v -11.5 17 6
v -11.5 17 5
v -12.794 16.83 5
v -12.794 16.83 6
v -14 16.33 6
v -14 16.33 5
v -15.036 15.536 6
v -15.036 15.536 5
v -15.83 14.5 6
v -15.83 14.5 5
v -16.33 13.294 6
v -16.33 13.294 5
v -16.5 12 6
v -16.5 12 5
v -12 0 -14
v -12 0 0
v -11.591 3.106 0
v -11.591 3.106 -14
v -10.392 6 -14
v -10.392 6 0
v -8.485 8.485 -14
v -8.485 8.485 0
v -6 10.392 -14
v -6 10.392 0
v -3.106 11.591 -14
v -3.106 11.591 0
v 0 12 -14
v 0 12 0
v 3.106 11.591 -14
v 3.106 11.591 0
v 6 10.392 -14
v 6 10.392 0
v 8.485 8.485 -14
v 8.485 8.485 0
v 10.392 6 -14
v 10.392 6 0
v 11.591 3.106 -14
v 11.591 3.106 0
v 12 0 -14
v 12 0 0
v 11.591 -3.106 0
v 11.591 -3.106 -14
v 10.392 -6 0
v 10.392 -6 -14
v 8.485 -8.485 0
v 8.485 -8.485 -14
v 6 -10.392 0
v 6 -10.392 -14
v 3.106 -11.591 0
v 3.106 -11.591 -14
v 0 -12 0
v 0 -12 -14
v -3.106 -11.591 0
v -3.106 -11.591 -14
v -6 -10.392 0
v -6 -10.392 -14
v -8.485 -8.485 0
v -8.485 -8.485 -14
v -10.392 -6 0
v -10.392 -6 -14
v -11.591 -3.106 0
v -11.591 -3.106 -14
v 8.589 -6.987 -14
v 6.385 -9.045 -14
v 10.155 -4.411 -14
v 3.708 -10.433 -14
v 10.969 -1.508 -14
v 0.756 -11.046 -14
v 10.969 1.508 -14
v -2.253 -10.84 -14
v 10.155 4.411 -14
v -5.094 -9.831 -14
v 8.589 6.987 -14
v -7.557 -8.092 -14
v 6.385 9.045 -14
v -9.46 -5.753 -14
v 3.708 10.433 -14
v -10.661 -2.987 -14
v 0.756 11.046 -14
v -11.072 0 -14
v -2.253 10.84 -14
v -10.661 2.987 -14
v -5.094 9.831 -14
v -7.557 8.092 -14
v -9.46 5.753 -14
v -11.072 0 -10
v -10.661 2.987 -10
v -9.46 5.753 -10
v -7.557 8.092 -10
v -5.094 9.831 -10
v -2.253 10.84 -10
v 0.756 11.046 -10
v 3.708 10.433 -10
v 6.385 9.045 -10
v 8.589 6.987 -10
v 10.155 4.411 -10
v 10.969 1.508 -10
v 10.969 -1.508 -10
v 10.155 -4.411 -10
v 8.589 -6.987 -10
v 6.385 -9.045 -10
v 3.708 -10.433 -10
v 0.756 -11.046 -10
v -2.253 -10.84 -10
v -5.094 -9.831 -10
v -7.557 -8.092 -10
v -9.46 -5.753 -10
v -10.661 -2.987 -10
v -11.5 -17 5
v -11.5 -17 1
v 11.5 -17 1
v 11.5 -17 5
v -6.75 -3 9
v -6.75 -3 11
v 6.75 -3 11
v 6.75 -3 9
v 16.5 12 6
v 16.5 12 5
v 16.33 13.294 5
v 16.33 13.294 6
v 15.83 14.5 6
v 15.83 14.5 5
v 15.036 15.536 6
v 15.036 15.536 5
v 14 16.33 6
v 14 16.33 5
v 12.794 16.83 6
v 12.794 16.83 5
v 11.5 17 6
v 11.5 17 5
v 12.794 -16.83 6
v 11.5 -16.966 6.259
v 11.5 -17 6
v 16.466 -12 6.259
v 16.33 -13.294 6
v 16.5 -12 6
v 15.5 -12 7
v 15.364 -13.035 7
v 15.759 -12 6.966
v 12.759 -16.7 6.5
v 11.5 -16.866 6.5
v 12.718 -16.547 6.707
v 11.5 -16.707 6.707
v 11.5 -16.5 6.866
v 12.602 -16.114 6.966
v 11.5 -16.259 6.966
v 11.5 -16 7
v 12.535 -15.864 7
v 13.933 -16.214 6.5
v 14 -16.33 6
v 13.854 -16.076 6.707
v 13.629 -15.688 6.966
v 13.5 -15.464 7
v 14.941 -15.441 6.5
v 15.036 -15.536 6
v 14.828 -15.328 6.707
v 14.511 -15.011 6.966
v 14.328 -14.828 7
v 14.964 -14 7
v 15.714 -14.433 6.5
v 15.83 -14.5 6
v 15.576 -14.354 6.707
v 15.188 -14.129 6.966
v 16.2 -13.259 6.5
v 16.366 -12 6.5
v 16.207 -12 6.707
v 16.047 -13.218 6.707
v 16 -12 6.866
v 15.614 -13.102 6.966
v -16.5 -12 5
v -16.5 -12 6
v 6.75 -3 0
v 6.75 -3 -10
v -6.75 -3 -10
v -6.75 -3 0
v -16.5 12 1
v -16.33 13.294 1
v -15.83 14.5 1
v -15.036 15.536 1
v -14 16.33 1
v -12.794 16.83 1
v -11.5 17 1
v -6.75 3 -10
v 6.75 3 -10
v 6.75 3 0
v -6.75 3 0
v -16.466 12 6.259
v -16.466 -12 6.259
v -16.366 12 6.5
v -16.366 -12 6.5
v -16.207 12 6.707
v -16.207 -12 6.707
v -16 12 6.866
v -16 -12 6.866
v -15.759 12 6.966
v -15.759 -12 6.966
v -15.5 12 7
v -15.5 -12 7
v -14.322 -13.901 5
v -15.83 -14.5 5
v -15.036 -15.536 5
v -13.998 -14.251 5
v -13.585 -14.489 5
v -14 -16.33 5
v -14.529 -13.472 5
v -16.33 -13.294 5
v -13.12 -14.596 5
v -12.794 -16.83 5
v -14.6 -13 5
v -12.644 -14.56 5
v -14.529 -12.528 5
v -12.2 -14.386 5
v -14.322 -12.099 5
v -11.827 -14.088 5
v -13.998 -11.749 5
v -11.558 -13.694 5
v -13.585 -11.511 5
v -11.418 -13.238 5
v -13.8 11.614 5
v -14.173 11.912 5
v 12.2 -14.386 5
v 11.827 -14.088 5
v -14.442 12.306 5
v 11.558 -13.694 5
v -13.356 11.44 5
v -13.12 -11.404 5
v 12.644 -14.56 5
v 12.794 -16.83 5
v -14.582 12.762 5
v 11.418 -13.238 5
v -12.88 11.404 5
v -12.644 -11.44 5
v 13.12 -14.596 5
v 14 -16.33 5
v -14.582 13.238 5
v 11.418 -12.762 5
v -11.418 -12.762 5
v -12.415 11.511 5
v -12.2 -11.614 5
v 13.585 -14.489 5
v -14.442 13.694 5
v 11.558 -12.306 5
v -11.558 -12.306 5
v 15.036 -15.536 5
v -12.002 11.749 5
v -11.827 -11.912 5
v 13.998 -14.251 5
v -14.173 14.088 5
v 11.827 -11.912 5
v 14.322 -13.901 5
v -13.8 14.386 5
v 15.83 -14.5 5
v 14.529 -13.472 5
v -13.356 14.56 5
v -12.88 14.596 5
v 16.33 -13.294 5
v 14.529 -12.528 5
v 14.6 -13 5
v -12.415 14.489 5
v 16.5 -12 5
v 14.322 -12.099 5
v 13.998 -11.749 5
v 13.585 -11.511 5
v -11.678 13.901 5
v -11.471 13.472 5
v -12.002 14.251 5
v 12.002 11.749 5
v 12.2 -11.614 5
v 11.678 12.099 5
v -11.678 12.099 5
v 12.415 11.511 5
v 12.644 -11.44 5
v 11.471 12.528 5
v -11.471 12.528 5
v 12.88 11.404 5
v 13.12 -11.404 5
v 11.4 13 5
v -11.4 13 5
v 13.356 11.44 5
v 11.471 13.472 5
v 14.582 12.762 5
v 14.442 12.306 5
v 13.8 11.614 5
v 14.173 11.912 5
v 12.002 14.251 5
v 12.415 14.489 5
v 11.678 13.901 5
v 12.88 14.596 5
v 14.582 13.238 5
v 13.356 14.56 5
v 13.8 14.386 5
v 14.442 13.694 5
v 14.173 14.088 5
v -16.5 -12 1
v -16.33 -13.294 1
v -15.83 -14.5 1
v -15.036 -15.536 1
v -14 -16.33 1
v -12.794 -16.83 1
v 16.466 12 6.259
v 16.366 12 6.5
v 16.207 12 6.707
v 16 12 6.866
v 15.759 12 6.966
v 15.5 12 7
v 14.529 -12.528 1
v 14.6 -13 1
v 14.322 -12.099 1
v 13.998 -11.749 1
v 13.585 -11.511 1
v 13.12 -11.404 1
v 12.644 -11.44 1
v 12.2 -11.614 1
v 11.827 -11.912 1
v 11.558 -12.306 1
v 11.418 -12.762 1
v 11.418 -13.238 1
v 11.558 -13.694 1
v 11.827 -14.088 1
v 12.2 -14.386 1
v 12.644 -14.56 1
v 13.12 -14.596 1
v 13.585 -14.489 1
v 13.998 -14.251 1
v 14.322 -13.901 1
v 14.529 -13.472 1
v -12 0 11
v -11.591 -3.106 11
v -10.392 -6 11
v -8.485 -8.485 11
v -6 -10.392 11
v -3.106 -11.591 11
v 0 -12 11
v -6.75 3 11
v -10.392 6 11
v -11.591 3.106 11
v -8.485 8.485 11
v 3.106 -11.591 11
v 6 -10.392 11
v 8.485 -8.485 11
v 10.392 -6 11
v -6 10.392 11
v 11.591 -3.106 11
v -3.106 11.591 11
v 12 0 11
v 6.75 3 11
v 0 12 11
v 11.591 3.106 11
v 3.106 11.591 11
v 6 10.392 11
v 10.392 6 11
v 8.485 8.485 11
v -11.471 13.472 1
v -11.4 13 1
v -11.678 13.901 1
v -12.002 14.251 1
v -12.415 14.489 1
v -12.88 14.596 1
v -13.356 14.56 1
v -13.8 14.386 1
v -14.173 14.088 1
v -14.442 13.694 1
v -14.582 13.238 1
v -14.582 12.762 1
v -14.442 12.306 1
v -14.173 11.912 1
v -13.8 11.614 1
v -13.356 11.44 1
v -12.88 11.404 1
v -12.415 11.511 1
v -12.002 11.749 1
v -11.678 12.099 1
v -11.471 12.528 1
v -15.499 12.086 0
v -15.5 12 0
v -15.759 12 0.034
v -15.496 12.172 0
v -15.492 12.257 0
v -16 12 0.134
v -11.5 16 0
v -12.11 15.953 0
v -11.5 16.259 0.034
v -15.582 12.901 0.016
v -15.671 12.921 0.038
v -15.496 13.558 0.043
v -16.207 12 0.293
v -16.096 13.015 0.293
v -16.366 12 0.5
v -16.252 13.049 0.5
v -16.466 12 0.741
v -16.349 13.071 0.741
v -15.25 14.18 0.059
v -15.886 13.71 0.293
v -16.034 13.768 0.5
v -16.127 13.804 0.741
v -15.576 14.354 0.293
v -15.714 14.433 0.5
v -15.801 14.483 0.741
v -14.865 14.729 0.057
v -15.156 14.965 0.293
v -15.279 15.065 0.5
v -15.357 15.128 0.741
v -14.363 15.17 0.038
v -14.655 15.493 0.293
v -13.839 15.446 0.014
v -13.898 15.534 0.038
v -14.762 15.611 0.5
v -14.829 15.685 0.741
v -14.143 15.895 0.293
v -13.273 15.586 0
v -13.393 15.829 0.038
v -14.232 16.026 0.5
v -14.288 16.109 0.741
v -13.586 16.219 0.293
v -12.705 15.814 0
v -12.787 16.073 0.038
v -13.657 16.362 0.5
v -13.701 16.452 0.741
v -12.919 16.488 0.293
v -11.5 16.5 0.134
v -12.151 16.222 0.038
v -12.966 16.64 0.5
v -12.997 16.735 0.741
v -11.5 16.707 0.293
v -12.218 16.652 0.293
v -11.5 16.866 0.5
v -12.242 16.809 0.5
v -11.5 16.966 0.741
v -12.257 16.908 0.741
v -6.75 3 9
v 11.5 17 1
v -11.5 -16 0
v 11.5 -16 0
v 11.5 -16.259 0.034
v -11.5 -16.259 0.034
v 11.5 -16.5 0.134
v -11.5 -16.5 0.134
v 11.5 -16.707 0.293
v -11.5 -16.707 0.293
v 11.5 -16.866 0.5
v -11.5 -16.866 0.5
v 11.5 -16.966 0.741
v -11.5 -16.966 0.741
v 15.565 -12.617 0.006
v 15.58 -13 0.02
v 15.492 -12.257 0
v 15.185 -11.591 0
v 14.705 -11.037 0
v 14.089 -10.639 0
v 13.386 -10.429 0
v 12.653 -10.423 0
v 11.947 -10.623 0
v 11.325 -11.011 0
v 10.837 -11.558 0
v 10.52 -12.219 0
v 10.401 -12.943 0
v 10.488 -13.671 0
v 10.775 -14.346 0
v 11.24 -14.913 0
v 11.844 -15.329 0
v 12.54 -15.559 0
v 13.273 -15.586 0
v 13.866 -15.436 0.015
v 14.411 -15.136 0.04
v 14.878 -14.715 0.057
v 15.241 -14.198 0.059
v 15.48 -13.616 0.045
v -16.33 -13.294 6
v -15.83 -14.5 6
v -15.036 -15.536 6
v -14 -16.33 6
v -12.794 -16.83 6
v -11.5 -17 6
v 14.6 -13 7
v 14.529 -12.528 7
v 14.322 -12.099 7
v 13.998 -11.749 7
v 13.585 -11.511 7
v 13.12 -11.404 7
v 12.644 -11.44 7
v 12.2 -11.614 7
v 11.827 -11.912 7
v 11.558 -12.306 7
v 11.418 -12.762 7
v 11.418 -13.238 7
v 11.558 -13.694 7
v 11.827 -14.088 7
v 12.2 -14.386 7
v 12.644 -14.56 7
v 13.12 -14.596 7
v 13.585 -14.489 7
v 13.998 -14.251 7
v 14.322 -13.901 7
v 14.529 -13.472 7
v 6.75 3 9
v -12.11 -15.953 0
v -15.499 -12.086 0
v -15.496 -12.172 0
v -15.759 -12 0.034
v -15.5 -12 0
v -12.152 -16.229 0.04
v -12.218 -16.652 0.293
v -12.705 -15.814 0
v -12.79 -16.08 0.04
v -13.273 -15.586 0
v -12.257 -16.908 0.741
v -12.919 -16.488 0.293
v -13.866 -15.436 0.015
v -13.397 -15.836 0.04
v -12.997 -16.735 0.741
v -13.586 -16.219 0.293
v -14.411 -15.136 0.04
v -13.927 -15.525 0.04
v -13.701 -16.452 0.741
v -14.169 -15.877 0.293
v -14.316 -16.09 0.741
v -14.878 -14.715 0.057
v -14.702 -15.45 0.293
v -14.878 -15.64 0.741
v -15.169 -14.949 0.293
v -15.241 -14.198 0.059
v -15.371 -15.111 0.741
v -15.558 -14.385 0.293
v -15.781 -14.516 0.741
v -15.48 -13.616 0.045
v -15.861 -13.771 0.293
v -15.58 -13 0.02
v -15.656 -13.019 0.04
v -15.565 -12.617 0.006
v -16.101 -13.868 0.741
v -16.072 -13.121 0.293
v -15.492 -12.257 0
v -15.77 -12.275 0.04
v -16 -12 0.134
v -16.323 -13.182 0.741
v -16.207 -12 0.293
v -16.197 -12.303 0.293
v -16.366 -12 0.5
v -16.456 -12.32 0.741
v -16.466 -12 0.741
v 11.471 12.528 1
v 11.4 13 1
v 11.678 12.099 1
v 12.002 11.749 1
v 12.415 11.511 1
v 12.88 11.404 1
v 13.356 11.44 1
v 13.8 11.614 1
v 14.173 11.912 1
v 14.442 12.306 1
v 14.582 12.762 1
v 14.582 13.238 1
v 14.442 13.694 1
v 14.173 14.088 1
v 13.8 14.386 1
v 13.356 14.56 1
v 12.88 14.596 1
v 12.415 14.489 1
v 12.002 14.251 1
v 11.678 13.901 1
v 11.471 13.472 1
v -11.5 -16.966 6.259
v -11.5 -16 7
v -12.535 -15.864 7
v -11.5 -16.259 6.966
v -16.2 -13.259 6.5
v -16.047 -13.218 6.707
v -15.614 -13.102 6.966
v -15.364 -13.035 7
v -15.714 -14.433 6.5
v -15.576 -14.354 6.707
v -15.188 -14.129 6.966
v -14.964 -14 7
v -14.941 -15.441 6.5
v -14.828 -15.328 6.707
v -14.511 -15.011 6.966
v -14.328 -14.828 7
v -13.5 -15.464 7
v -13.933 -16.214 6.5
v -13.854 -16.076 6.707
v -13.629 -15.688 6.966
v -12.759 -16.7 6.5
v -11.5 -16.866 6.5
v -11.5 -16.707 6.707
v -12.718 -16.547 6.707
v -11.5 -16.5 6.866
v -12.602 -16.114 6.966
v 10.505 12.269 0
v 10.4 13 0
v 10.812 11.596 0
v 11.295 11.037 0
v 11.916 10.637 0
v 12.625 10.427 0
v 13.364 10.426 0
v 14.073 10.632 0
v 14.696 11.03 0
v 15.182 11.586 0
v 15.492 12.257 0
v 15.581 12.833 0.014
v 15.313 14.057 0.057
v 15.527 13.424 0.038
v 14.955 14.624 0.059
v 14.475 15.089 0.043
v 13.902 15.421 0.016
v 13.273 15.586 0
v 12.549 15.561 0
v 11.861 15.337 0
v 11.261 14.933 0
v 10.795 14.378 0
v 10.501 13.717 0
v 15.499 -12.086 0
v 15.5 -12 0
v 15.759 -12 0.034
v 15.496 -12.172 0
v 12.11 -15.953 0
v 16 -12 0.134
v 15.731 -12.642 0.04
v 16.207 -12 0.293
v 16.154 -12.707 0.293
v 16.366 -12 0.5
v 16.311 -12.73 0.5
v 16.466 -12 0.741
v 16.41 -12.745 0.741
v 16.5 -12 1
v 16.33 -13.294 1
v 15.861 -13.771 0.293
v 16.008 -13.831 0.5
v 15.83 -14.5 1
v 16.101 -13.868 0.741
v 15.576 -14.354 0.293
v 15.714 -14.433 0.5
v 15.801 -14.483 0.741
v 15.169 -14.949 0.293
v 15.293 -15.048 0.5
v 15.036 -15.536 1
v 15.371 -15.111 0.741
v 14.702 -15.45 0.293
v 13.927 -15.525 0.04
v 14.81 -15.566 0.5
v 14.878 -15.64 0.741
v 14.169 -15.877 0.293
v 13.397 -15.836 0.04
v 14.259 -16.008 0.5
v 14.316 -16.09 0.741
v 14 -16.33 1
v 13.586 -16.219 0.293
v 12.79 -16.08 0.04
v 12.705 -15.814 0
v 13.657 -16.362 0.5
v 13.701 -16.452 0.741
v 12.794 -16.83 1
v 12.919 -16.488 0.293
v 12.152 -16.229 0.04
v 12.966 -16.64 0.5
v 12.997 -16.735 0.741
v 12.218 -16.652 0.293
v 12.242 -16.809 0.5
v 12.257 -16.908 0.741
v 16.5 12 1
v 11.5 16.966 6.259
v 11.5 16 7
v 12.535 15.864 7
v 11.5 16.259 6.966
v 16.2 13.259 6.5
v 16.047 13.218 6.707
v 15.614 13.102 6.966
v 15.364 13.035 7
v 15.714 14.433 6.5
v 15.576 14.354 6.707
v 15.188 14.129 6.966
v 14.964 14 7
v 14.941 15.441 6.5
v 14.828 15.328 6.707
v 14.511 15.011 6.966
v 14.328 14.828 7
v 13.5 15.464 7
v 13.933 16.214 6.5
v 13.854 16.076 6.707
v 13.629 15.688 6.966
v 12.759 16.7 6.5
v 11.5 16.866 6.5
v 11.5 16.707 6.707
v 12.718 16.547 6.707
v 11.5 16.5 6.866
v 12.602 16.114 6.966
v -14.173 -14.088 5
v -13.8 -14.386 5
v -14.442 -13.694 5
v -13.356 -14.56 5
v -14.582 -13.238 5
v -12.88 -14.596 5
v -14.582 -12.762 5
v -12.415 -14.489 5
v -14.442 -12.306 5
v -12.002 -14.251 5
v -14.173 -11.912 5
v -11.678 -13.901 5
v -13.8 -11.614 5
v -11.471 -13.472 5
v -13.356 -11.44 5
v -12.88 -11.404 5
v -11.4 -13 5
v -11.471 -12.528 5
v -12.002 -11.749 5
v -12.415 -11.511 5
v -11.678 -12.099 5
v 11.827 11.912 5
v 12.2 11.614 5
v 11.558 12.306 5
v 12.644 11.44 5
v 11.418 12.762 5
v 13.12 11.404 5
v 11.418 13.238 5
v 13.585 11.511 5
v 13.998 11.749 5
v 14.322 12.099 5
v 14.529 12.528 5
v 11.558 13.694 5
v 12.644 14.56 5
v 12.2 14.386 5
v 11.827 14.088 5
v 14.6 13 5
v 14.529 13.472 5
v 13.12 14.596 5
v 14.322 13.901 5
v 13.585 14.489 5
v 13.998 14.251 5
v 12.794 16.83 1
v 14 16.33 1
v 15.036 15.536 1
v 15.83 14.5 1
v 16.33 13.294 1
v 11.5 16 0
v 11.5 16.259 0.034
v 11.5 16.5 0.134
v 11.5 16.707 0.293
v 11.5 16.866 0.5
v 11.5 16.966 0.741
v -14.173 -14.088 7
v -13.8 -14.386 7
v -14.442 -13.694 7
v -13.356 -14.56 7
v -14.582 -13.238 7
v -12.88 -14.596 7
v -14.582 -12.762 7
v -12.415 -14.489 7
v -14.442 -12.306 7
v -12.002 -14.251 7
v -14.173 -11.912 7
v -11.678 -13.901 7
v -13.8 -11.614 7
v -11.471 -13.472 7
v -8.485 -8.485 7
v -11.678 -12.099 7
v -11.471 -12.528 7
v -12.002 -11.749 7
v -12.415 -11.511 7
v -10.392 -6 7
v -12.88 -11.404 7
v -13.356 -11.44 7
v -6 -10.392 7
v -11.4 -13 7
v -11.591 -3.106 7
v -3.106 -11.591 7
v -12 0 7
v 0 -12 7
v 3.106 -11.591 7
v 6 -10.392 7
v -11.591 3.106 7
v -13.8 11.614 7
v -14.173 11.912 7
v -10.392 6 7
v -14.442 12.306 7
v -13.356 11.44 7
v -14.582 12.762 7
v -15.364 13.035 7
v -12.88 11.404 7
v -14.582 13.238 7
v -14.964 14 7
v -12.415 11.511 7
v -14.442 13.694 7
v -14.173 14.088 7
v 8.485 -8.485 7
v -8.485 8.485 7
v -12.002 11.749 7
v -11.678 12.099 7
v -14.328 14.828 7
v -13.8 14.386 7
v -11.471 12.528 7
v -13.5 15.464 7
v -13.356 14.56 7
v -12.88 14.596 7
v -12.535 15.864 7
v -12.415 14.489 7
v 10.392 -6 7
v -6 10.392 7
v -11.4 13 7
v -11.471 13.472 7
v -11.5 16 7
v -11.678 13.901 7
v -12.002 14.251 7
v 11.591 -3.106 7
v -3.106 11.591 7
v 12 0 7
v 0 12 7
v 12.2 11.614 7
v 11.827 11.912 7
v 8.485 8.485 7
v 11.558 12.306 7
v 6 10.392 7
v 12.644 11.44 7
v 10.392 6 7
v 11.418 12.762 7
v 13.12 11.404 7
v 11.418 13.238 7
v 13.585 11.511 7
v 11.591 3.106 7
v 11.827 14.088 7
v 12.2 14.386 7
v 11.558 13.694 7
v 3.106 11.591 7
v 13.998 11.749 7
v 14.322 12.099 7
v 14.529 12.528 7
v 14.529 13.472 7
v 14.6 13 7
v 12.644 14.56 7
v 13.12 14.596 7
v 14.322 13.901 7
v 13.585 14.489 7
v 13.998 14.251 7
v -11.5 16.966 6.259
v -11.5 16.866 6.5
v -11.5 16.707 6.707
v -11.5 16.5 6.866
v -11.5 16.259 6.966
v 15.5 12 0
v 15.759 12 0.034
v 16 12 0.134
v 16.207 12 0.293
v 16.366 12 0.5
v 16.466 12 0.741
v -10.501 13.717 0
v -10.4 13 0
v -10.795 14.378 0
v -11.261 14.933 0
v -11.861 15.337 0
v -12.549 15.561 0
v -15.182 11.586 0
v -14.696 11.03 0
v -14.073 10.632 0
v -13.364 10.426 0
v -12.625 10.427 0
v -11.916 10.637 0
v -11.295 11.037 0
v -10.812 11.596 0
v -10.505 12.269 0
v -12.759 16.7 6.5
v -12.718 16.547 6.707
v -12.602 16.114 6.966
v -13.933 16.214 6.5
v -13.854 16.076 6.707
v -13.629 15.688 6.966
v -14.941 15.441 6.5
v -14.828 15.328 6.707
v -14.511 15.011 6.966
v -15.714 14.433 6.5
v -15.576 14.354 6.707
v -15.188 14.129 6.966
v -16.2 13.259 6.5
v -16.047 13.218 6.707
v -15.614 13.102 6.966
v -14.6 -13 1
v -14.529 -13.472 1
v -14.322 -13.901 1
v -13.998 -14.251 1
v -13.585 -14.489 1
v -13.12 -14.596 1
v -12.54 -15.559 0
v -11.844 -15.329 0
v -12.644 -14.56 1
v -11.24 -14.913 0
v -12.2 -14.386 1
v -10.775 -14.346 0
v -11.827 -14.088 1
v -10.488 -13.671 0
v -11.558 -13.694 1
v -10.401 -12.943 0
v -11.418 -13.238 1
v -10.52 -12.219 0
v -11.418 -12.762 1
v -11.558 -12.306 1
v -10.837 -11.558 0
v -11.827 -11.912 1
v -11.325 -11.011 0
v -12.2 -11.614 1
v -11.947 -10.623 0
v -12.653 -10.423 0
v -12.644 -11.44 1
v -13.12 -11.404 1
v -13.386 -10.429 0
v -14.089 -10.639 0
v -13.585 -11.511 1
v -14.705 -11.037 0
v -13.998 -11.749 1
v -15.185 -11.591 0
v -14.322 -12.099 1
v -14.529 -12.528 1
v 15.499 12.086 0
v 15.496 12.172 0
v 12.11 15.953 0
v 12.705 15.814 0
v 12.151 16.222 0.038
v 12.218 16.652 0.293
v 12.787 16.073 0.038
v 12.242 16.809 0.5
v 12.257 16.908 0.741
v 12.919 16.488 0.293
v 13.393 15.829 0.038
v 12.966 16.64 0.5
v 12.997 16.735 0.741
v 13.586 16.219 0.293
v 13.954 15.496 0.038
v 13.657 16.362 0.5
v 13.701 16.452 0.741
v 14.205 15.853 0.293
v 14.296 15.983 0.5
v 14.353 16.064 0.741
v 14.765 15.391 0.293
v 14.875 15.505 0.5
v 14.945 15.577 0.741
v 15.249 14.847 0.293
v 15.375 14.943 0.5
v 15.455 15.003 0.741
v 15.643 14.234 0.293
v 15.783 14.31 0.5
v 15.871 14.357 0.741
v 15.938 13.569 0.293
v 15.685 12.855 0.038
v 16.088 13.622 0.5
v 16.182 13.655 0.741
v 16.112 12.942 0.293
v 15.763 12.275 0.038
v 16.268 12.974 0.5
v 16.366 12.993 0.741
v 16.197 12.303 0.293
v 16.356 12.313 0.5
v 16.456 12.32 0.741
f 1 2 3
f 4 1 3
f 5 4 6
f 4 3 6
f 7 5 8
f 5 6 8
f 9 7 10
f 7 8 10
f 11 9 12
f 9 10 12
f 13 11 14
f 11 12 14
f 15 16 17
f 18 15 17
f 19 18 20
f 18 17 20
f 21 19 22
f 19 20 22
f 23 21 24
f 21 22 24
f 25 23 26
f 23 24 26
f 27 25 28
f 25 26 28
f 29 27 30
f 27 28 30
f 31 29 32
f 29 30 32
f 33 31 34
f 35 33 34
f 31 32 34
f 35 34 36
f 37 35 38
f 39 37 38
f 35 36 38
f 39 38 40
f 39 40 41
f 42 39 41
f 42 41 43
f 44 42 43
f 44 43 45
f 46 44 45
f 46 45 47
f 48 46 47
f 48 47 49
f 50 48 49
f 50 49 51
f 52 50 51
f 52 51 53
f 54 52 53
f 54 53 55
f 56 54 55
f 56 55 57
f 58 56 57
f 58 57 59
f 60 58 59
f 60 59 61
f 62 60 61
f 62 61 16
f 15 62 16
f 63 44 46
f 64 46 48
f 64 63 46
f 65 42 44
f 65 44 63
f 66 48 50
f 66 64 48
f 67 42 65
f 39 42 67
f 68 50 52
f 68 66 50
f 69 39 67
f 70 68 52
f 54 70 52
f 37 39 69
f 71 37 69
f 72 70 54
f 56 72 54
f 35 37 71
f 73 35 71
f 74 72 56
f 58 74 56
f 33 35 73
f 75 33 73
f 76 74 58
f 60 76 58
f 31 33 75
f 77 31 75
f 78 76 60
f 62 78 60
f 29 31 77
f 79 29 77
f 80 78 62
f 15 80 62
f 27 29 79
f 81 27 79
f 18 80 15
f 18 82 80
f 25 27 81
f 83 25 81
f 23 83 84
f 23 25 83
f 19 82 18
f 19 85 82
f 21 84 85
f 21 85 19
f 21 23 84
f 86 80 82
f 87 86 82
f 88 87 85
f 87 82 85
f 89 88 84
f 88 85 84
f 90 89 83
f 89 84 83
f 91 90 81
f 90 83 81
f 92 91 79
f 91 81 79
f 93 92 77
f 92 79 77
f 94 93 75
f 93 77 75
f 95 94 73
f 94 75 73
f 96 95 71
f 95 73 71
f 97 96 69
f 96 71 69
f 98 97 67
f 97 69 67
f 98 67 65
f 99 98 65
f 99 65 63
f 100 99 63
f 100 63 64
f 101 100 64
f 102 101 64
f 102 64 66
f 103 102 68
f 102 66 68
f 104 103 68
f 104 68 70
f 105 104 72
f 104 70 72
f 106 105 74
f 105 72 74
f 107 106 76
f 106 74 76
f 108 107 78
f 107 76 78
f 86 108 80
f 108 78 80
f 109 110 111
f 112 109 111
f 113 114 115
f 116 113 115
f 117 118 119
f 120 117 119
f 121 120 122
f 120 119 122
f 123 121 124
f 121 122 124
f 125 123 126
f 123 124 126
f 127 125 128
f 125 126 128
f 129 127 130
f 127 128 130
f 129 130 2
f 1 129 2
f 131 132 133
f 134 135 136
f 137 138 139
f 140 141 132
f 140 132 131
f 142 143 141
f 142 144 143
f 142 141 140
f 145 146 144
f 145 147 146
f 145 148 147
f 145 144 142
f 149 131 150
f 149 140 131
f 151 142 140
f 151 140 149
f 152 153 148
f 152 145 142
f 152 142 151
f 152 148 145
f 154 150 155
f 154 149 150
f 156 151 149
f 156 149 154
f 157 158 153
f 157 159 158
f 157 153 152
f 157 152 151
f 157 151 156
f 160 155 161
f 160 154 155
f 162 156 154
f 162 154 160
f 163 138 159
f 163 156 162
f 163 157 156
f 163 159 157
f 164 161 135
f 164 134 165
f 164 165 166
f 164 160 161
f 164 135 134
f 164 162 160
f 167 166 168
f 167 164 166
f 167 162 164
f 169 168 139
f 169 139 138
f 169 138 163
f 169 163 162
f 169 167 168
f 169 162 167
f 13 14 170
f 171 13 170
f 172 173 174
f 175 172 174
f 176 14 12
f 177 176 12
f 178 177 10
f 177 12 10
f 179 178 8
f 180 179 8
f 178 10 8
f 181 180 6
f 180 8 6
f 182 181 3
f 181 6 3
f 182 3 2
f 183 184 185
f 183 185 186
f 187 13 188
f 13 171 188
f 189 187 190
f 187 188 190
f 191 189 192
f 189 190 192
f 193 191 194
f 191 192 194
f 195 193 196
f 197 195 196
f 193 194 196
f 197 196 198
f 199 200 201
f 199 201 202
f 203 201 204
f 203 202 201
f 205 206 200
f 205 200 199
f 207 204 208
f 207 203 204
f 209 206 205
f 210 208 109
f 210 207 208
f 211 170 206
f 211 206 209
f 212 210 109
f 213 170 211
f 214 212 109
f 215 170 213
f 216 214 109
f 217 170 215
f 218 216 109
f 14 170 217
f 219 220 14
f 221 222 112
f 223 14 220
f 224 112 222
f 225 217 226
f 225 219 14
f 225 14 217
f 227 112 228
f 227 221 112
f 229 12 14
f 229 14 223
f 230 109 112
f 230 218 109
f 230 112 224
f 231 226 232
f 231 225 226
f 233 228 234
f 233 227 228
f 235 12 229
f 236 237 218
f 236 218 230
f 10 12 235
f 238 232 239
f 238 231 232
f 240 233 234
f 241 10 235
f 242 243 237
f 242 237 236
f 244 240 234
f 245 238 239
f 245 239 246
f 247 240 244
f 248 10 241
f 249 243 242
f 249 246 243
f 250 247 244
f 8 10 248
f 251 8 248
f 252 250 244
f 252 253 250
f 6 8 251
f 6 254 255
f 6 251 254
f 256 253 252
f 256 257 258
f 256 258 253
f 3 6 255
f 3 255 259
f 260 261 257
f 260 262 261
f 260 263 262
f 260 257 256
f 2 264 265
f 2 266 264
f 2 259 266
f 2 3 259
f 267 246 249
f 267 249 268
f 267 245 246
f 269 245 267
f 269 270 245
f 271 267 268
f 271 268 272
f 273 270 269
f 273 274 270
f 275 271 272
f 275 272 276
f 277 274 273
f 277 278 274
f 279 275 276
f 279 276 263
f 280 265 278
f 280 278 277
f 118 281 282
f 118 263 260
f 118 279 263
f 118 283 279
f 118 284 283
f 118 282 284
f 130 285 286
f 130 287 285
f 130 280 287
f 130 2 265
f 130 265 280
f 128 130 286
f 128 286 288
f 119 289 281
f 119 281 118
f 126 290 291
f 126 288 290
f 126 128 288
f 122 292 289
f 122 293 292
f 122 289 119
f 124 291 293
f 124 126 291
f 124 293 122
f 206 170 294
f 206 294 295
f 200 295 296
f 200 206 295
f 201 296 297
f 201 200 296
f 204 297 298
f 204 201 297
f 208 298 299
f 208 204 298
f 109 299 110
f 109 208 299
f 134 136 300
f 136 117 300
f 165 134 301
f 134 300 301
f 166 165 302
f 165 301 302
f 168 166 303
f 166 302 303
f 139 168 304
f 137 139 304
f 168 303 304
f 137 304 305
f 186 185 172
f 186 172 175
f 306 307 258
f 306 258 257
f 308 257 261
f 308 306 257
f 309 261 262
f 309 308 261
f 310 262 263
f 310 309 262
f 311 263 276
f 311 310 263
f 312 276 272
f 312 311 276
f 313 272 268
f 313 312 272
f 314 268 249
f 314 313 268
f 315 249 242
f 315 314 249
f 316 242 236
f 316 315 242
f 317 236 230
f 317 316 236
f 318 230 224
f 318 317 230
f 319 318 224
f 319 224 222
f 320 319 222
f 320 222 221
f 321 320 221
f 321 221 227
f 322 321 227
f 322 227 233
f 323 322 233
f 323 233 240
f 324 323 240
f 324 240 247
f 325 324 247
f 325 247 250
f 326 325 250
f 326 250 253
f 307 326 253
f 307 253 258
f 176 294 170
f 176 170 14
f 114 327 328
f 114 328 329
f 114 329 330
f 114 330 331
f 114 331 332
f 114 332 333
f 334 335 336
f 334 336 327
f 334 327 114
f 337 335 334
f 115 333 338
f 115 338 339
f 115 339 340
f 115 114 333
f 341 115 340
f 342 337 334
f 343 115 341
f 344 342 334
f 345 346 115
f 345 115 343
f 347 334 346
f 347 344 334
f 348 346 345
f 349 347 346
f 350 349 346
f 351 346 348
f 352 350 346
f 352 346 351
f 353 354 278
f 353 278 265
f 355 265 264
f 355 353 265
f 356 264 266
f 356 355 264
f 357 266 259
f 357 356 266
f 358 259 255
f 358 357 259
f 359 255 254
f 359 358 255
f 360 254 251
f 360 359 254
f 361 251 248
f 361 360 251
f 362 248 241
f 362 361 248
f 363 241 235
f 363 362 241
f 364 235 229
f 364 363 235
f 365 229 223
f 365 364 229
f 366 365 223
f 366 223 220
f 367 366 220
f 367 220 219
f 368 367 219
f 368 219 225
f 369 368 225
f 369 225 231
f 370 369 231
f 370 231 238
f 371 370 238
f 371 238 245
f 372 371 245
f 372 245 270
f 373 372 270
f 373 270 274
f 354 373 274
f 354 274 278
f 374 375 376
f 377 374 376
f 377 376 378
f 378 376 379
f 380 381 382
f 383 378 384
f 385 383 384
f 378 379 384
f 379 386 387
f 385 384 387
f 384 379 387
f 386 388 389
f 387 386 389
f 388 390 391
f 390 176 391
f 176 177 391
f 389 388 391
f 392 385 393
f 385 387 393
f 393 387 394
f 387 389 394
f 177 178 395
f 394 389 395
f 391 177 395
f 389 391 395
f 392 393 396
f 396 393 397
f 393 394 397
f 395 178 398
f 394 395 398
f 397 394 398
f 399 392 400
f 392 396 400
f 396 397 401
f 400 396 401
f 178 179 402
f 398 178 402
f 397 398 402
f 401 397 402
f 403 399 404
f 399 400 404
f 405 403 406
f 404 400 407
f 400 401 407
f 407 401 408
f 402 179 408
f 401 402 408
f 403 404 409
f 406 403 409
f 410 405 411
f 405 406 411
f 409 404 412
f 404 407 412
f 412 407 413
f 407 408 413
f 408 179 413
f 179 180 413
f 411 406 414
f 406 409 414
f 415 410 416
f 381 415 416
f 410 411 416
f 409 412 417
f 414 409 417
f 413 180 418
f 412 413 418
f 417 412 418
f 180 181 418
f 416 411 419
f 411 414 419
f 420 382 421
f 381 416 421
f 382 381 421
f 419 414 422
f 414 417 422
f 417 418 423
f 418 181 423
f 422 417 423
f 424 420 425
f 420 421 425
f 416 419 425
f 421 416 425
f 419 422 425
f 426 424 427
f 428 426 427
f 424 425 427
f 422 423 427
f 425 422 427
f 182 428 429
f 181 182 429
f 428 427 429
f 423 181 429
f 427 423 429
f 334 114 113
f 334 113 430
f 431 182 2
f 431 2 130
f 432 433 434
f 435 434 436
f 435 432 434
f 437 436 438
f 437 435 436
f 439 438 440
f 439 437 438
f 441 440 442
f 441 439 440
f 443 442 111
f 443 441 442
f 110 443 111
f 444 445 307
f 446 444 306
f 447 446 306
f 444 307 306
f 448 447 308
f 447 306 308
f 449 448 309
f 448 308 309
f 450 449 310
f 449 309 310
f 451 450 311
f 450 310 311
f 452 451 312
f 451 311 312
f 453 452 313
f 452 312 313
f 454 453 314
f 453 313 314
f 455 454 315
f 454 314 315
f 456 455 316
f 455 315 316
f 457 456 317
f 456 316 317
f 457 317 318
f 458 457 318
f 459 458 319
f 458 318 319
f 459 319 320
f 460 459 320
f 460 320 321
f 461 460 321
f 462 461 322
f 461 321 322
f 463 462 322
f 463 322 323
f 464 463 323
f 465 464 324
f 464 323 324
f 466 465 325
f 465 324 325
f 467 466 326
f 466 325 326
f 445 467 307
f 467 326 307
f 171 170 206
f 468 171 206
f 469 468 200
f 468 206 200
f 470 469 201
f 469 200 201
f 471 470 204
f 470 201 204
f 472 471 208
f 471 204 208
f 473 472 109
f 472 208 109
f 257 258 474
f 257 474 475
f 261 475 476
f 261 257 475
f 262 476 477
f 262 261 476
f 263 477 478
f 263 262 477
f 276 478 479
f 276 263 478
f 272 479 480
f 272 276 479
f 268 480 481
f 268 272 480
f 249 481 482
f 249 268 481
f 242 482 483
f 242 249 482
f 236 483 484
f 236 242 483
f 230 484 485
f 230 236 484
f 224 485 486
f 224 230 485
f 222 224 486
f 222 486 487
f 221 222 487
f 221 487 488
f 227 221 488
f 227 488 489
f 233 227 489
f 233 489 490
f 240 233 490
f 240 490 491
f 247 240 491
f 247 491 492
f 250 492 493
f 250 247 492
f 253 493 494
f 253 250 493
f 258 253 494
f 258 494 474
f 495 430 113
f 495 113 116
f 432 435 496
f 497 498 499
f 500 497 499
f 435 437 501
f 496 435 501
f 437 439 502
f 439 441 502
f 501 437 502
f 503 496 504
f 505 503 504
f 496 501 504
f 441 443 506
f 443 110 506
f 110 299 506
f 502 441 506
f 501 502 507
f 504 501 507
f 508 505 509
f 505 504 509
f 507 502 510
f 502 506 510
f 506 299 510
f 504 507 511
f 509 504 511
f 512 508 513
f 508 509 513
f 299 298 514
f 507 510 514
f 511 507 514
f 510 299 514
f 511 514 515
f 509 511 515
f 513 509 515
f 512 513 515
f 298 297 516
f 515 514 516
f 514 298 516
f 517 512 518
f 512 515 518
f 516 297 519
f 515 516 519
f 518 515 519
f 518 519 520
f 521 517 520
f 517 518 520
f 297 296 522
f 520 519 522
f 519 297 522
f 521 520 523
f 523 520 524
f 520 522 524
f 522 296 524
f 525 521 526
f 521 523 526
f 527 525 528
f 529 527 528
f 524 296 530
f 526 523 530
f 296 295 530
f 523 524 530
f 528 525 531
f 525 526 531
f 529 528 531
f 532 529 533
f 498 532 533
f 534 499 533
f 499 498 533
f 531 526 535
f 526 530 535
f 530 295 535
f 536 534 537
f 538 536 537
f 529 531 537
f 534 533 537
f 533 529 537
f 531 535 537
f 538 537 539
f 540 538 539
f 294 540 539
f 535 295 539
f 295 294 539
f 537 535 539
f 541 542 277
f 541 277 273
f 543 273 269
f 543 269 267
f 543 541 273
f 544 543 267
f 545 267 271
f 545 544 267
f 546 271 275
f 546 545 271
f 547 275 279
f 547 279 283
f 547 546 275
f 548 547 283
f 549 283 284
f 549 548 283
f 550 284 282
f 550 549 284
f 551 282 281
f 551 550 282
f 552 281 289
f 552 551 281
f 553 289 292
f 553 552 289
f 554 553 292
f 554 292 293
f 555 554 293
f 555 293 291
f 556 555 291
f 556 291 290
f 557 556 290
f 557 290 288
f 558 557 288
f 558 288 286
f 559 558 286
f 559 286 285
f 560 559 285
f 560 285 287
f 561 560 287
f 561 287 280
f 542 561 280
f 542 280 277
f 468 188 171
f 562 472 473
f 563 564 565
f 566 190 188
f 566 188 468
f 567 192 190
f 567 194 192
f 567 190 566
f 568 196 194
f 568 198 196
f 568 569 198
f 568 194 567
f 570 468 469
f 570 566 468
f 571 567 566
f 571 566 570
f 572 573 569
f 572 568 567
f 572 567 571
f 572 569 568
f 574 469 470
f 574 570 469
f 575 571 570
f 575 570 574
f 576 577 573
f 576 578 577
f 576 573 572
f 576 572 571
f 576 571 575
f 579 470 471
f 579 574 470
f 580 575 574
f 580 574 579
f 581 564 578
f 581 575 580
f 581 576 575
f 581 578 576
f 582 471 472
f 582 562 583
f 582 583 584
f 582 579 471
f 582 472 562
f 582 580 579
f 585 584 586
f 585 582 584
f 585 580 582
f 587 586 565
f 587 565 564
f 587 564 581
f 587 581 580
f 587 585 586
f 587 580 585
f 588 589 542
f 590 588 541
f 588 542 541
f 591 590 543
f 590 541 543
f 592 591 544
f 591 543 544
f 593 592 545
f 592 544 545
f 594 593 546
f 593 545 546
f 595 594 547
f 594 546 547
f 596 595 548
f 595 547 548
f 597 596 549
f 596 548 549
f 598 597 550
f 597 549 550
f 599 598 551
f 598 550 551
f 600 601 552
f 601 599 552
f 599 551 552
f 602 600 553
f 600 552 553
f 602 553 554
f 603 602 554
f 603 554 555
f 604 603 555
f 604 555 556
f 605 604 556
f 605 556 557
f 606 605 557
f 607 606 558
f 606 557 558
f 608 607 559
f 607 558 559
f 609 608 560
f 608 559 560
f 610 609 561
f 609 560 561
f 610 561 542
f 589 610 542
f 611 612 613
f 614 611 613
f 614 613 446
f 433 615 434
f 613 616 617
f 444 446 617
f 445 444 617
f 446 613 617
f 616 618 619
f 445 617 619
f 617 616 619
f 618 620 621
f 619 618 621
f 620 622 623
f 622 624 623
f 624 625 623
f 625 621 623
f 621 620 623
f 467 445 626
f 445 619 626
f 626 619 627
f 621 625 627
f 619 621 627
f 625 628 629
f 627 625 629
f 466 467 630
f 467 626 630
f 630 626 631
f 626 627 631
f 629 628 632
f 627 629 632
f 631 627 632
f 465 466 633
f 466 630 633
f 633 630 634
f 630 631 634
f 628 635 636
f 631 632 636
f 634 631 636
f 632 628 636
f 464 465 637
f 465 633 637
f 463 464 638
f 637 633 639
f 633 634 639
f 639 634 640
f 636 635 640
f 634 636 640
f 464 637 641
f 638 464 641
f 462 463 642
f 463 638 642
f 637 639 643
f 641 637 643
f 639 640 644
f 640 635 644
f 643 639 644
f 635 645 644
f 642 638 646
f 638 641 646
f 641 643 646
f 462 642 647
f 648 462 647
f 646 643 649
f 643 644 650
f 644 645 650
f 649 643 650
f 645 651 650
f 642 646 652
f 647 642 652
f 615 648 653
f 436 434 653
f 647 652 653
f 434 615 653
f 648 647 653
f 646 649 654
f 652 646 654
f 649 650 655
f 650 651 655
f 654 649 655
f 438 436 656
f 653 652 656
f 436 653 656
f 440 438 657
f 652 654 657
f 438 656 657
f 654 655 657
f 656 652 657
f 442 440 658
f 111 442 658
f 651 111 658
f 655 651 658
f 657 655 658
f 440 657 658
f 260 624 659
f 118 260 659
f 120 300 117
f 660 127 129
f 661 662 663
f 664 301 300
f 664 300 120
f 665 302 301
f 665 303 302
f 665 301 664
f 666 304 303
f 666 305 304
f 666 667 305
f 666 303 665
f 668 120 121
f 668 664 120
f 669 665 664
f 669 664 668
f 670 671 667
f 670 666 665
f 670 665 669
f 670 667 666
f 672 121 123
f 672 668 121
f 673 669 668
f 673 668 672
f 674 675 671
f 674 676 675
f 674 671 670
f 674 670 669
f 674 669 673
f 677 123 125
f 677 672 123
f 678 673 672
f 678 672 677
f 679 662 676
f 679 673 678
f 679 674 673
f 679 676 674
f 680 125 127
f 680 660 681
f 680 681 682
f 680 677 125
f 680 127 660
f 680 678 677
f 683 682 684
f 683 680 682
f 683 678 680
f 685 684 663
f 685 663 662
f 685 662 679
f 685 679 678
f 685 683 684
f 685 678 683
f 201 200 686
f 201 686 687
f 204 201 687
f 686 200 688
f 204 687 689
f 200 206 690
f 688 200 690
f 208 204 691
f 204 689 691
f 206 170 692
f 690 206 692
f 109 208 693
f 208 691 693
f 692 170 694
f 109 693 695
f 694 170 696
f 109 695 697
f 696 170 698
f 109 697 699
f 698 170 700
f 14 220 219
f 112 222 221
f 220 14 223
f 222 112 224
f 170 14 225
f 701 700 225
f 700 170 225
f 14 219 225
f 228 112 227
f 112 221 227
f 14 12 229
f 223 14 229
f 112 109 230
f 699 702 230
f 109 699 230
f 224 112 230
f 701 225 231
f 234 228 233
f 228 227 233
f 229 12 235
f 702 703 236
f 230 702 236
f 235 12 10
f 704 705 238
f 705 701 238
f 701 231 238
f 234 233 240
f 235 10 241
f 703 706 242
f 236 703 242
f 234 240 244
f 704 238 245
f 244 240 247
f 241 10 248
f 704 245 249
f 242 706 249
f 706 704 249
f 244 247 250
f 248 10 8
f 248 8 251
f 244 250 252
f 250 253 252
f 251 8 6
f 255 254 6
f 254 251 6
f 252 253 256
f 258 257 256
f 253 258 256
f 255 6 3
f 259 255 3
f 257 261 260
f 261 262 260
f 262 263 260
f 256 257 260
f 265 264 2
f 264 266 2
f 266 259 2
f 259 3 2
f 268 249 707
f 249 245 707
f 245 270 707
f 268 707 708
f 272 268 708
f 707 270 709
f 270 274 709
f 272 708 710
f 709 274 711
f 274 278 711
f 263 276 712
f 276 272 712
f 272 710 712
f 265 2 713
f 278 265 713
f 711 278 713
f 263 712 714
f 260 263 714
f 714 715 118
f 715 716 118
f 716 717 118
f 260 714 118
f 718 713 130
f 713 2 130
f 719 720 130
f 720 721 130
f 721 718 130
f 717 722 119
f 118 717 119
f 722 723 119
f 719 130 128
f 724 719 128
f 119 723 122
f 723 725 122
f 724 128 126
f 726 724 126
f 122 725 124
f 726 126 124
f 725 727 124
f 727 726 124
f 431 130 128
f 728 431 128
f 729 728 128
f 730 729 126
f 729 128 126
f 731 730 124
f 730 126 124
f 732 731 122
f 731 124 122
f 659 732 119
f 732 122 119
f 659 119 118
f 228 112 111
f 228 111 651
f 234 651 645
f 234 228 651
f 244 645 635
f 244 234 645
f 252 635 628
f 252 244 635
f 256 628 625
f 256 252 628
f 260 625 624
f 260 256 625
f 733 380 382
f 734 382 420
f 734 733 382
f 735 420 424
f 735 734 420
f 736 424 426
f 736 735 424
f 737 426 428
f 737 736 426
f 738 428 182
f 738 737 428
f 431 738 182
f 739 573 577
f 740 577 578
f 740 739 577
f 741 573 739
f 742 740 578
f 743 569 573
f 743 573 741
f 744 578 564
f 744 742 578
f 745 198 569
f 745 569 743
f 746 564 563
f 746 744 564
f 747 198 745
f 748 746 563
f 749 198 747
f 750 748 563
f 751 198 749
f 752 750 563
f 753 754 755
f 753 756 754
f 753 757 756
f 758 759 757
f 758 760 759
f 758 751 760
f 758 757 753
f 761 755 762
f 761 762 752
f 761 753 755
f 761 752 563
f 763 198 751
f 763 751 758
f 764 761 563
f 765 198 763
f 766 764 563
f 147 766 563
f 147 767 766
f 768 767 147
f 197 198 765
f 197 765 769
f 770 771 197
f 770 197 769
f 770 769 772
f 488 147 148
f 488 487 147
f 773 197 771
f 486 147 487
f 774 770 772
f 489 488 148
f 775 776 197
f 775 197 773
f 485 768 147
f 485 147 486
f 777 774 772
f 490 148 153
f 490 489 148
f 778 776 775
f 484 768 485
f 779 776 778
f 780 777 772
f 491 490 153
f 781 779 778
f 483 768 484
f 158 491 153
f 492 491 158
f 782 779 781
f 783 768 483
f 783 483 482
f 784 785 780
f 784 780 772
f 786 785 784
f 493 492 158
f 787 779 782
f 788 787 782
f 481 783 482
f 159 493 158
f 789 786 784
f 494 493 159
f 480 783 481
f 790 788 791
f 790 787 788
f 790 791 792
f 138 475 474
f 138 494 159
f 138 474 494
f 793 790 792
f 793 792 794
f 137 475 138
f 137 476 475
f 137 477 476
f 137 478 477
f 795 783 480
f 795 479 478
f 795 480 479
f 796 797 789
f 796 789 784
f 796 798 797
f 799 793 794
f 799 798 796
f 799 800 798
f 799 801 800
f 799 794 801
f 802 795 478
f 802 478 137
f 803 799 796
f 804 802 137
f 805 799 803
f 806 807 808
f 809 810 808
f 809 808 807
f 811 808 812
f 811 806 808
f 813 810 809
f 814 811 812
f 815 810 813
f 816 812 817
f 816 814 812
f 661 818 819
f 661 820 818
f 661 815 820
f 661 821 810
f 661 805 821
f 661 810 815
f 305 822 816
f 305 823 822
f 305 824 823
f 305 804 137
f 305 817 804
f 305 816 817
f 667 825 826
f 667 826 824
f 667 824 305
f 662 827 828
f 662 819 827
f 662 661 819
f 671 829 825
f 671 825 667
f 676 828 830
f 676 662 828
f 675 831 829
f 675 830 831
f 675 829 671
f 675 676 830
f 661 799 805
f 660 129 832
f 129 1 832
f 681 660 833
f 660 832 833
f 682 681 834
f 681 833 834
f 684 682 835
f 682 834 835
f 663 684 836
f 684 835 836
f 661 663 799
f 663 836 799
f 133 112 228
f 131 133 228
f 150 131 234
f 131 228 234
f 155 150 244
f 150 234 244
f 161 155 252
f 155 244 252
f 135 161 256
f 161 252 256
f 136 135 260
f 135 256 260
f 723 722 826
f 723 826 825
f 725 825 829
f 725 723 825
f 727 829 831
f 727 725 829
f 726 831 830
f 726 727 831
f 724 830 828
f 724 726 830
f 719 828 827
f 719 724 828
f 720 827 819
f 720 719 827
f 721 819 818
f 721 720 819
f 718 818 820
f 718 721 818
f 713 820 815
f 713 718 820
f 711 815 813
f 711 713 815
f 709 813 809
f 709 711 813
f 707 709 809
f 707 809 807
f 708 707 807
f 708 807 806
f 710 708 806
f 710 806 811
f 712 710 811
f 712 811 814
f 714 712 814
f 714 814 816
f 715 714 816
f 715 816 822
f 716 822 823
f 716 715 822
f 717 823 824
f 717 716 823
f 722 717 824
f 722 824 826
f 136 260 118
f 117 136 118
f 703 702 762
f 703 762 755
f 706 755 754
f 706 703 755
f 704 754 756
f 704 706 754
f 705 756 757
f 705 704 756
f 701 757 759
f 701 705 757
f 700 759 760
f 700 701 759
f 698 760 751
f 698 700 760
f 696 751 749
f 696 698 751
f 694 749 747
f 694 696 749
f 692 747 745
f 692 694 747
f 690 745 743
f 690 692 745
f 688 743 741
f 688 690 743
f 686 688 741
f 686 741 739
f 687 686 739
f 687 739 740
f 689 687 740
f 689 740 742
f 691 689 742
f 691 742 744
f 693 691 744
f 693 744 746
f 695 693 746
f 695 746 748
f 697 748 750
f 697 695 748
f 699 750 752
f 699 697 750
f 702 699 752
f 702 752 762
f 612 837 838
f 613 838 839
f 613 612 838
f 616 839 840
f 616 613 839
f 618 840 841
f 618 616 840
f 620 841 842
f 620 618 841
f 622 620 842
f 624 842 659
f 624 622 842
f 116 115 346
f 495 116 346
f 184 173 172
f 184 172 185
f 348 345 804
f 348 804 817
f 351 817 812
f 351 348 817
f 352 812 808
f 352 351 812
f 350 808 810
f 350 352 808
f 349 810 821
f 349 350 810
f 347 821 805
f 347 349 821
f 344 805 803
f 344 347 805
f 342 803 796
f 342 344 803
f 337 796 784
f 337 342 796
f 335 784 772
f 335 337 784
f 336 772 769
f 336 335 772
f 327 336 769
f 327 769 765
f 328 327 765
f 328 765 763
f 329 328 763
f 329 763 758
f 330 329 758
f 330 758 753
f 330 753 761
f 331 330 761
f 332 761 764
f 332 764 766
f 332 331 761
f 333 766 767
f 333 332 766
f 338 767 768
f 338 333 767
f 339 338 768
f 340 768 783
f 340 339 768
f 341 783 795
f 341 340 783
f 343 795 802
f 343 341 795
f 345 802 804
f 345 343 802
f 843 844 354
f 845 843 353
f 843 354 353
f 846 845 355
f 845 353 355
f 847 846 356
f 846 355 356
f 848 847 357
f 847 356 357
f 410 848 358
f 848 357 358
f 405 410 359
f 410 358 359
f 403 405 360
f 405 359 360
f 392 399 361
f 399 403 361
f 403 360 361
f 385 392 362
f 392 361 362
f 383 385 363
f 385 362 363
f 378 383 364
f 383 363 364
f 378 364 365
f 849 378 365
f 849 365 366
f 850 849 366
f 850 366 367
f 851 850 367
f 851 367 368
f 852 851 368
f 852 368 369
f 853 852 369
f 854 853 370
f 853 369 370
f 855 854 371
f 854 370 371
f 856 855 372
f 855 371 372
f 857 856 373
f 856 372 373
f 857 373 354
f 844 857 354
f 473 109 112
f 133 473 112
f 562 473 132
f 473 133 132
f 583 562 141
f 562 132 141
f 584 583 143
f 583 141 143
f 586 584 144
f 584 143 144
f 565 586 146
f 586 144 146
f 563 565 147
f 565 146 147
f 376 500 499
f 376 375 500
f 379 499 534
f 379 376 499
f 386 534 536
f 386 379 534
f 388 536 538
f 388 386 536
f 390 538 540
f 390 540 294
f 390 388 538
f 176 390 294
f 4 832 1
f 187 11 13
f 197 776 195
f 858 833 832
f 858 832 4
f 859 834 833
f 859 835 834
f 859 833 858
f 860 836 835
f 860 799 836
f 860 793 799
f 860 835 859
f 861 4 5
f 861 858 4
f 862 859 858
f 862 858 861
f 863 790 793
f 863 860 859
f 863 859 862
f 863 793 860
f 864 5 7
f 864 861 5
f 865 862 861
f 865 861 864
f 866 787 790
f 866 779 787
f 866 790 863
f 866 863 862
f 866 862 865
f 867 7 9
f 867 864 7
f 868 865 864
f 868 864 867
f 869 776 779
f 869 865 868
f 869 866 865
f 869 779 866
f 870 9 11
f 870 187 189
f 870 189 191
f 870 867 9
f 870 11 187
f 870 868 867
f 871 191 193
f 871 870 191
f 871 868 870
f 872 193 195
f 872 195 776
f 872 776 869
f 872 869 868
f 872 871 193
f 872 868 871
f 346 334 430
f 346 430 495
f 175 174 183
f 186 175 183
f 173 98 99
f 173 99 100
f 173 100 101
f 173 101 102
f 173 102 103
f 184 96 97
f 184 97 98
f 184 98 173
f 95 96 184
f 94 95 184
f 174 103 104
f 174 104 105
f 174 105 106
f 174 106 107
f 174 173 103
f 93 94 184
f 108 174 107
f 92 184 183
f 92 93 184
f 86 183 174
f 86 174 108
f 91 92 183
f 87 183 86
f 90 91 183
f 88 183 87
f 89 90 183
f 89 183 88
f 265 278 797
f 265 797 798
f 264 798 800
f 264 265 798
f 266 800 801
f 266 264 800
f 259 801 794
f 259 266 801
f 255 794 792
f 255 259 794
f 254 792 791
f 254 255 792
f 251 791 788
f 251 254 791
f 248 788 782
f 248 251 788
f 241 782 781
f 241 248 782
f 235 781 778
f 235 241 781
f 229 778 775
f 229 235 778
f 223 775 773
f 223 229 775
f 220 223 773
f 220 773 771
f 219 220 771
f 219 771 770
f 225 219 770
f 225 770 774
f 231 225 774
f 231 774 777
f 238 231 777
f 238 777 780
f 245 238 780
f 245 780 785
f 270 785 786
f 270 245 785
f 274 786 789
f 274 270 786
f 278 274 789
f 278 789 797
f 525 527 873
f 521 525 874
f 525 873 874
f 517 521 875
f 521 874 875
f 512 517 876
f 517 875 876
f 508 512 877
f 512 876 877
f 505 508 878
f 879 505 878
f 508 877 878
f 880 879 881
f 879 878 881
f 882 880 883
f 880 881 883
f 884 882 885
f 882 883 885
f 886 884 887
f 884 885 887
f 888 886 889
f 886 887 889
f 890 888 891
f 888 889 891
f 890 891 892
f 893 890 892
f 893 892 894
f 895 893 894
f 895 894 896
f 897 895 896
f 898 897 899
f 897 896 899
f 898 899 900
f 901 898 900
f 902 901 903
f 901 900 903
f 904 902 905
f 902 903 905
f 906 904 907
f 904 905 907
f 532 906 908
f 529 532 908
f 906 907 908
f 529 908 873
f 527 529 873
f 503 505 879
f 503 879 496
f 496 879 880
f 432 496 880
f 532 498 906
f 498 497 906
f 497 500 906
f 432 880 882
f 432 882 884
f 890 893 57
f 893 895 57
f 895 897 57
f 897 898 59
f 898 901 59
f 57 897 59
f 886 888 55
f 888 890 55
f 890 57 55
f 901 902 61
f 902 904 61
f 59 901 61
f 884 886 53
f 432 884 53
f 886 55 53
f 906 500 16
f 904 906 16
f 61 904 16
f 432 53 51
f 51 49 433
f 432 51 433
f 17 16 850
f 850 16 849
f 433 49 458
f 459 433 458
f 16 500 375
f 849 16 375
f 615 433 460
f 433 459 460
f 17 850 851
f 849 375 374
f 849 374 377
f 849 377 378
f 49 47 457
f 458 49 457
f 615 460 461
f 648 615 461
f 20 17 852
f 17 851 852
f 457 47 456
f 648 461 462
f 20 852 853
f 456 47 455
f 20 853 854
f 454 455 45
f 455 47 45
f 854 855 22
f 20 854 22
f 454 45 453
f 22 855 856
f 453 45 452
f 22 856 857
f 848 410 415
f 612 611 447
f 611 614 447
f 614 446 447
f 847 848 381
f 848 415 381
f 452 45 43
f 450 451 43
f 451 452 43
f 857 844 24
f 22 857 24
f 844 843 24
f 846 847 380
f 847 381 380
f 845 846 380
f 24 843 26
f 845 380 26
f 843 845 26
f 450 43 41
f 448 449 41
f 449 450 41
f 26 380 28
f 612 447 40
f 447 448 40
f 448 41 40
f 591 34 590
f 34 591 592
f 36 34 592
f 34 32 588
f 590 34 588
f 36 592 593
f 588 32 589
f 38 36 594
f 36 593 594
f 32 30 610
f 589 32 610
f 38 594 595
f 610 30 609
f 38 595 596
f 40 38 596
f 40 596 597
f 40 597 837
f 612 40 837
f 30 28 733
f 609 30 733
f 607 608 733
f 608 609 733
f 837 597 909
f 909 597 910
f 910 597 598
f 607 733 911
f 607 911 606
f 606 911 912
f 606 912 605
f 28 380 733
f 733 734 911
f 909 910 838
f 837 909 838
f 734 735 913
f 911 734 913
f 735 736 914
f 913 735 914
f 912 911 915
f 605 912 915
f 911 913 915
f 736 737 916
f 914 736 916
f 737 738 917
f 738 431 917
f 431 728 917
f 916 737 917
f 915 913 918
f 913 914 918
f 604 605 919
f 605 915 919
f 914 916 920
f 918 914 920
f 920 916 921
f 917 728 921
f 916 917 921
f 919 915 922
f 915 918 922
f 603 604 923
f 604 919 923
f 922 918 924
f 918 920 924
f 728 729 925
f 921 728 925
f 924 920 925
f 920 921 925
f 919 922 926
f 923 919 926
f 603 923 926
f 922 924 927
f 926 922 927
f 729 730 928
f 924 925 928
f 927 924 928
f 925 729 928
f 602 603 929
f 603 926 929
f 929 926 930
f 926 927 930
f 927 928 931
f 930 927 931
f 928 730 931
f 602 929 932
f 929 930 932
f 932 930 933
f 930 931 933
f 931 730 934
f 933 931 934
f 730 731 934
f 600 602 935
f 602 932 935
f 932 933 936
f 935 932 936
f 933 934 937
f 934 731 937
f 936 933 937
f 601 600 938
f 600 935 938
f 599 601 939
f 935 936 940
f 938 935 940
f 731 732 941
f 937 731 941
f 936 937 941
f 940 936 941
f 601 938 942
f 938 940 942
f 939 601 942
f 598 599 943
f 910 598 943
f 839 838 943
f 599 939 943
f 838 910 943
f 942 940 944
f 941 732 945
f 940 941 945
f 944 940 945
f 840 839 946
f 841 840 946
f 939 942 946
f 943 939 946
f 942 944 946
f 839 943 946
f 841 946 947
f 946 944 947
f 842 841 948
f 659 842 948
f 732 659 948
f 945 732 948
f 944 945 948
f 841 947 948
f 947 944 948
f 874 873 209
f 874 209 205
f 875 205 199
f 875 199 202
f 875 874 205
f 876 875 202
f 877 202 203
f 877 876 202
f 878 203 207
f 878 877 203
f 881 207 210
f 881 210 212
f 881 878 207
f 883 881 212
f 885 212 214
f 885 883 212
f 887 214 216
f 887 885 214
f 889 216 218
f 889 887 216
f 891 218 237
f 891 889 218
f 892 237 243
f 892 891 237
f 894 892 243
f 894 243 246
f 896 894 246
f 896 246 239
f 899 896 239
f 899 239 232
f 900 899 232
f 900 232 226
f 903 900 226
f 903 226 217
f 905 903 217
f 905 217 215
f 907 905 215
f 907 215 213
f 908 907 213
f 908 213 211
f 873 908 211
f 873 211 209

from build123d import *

# Parameters (mm, degrees)
SKETCH1_W                = 33
SKETCH1_H                = 34
SKETCH1_R                = 12
SKETCH1_R_2              = 1.6
BOSS_EXTRUDE1_DEPTH      = 5
FILLET1_R                = 5
BOSS_EXTRUDE2_DEPTH      = 14
BOSS_EXTRUDE2_DEPTH_BACK = 5
SKETCH2_R                = 12
SKETCH3_R                = 1.6
BOSS_EXTRUDE3_DEPTH      = 2
FILLET2_R                = 1
FILLET3_R                = 1
CHAMFER1_SIZE            = 1
BOSS_EXTRUDE4_START      = 4
SKETCH4_R                = 12
BOSS_EXTRUDE4_DEPTH      = 4
SKETCH5_R                = 11.071904539
CUT_EXTRUDE1_DEPTH       = 4
SKETCH6_W                = 13.5
SKETCH6_H                = 6
CUT_EXTRUDE2_DEPTH       = 2
SKETCH7_W                = 13.5
SKETCH7_H                = 6
CUT_EXTRUDE3_DEPTH       = 10


with BuildPart() as part:
    # Sketch1 → Boss-Extrude1 (new body)
    with BuildSketch(Plane.XY):
        Rectangle(SKETCH1_W, SKETCH1_H)
        Circle(SKETCH1_R, mode=Mode.SUBTRACT)
        with Locations((-13, 13)):
            Circle(SKETCH1_R_2, mode=Mode.SUBTRACT)
        with Locations((13, -13)):
            Circle(SKETCH1_R_2, mode=Mode.SUBTRACT)
        with Locations(Location((13, 13, 0), (0, 0, 180))):
            Circle(SKETCH1_R_2, mode=Mode.SUBTRACT)
        with Locations(Location((-13, -13, 0), (0, 0, 180))):
            Circle(SKETCH1_R_2, mode=Mode.SUBTRACT)
    extrude(amount=BOSS_EXTRUDE1_DEPTH)

    # Fillet1
    fillet1_edges = [part.edges().sort_by_distance(p)[0] for p in [
        (16.5, -17, 2.5),
        (-16.5, -17, 2.5),
        (-16.5, 17, 2.5),
        (16.5, 17, 2.5),
    ]]
    fillet(fillet1_edges, radius=FILLET1_R)

    # Sketch2 → Boss-Extrude2 (add, two sides: drawn at the far end of the back side and taken through both)
    with BuildSketch(Plane(origin=(0, 0, 0), x_dir=(-1, 0, 0), z_dir=(0, 0, -1)).offset(-BOSS_EXTRUDE2_DEPTH_BACK)):
        Circle(SKETCH2_R)
    extrude(amount=BOSS_EXTRUDE2_DEPTH + BOSS_EXTRUDE2_DEPTH_BACK)

    # Fillet2
    fillet2_edges = [part.edges().sort_by_distance(p)[0] for p in [
        (-16.5, 0, 0),
        (16.5, 0, 0),
        (0, -17, 0),
        (0, 17, 0),
        (15.035533906, 15.535533906, 0),
        (15.035533906, -15.535533906, 0),
        (-15.035533906, -15.535533906, 0),
        (-15.035533906, 15.535533906, 0),
    ]]
    fillet(fillet2_edges, radius=FILLET2_R)

    # Chamfer1
    # the kernel refuses this chamfer: 1 mm, written as the material it takes off along each edge
    with BuildSketch(Plane(origin=(-13, 13, 0), x_dir=(1, 0, 0), z_dir=(0, -1, 0))) as chamfer1_piece_1:
        Polygon((1.6 + CHAMFER1_SIZE, 0), (1.6, CHAMFER1_SIZE), (1.6, 0), align=None)
    revolve(axis=Axis((-13, 13, 0), (0, 0, 1)), mode=Mode.SUBTRACT)
    with BuildSketch(Plane(origin=(13, -13, 0), x_dir=(1, 0, 0), z_dir=(0, -1, 0))) as chamfer1_piece_2:
        Polygon((1.6 + CHAMFER1_SIZE, 0), (1.6, CHAMFER1_SIZE), (1.6, 0), align=None)
    revolve(axis=Axis((13, -13, 0), (0, 0, 1)), mode=Mode.SUBTRACT)
    with BuildSketch(Plane(origin=(13, 13, 0), x_dir=(-1, 0, 0), z_dir=(0, 1, 0))) as chamfer1_piece_3:
        Polygon((1.6 + CHAMFER1_SIZE, 0), (1.6, CHAMFER1_SIZE), (1.6, 0), align=None)
    revolve(axis=Axis((13, 13, 0), (0, 0, 1)), mode=Mode.SUBTRACT)
    with BuildSketch(Plane(origin=(-13, -13, 0), x_dir=(-1, 0, 0), z_dir=(0, 1, 0))) as chamfer1_piece_4:
        Polygon((1.6 + CHAMFER1_SIZE, 0), (1.6, CHAMFER1_SIZE), (1.6, 0), align=None)
    revolve(axis=Axis((-13, -13, 0), (0, 0, 1)), mode=Mode.SUBTRACT)

    # Sketch5 → Cut-Extrude1 (cut)
    with BuildSketch(Plane(origin=(0, 0, -14), x_dir=(-1, 0, 0), z_dir=(0, 0, -1))):
        Circle(SKETCH5_R)
    extrude(amount=-CUT_EXTRUDE1_DEPTH, mode=Mode.SUBTRACT)

    # Sketch7 → Cut-Extrude3 (cut)
    with BuildSketch(Plane(origin=(0, 0, -10), x_dir=(-1, 0, 0), z_dir=(0, 0, -1))):
        Rectangle(SKETCH7_W, SKETCH7_H)
    extrude(amount=-CUT_EXTRUDE3_DEPTH, mode=Mode.SUBTRACT)


with BuildPart() as body_2:
    # Sketch3 → Boss-Extrude3 (new body)
    with BuildSketch(Plane.XY.offset(5)):
        with BuildLine():
            Line((-11.5, -17), (11.5, -17))
            ThreePointArc((11.5, -17), (15.035533906, -15.535533906), (16.5, -12))
            Line((16.5, -12), (16.5, 12))
            ThreePointArc((16.5, 12), (15.035533906, 15.535533906), (11.5, 17))
            Line((11.5, 17), (-11.5, 17))
            ThreePointArc((-11.5, 17), (-15.035533906, 15.535533906), (-16.5, 12))
            Line((-16.5, 12), (-16.5, -12))
            ThreePointArc((-16.5, -12), (-15.035533906, -15.535533906), (-11.5, -17))
        make_face()
        with Locations((-13, 13)):
            Circle(SKETCH3_R, mode=Mode.SUBTRACT)
        with Locations((13, 13)):
            Circle(SKETCH3_R, mode=Mode.SUBTRACT)
        with Locations((13, -13)):
            Circle(SKETCH3_R, mode=Mode.SUBTRACT)
        with Locations((-13, -13)):
            Circle(SKETCH3_R, mode=Mode.SUBTRACT)
    extrude(amount=BOSS_EXTRUDE3_DEPTH)

    # Fillet3
    fillet3_edges = [body_2.edges().sort_by_distance(p)[0] for p in [
        (15.035533906, -15.535533906, 7),
        (16.5, 0, 7),
        (15.035533906, 15.535533906, 7),
        (0, 17, 7),
        (-15.035533906, 15.535533906, 7),
        (-16.5, 0, 7),
        (-15.035533906, -15.535533906, 7),
        (0, -17, 7),
    ]]
    fillet(fillet3_edges, radius=FILLET3_R)

    # Sketch4 → Boss-Extrude4 (add)
    with BuildSketch(Plane.XY.offset(7).offset(BOSS_EXTRUDE4_START)):
        Circle(SKETCH4_R)
    extrude(amount=-BOSS_EXTRUDE4_DEPTH)

    # Sketch6 → Cut-Extrude2 (cut)
    with BuildSketch(Plane.XY.offset(11)):
        Rectangle(SKETCH6_W, SKETCH6_H)
    extrude(amount=-CUT_EXTRUDE2_DEPTH, mode=Mode.SUBTRACT)


solid = Compound([part.part, body_2.part])
